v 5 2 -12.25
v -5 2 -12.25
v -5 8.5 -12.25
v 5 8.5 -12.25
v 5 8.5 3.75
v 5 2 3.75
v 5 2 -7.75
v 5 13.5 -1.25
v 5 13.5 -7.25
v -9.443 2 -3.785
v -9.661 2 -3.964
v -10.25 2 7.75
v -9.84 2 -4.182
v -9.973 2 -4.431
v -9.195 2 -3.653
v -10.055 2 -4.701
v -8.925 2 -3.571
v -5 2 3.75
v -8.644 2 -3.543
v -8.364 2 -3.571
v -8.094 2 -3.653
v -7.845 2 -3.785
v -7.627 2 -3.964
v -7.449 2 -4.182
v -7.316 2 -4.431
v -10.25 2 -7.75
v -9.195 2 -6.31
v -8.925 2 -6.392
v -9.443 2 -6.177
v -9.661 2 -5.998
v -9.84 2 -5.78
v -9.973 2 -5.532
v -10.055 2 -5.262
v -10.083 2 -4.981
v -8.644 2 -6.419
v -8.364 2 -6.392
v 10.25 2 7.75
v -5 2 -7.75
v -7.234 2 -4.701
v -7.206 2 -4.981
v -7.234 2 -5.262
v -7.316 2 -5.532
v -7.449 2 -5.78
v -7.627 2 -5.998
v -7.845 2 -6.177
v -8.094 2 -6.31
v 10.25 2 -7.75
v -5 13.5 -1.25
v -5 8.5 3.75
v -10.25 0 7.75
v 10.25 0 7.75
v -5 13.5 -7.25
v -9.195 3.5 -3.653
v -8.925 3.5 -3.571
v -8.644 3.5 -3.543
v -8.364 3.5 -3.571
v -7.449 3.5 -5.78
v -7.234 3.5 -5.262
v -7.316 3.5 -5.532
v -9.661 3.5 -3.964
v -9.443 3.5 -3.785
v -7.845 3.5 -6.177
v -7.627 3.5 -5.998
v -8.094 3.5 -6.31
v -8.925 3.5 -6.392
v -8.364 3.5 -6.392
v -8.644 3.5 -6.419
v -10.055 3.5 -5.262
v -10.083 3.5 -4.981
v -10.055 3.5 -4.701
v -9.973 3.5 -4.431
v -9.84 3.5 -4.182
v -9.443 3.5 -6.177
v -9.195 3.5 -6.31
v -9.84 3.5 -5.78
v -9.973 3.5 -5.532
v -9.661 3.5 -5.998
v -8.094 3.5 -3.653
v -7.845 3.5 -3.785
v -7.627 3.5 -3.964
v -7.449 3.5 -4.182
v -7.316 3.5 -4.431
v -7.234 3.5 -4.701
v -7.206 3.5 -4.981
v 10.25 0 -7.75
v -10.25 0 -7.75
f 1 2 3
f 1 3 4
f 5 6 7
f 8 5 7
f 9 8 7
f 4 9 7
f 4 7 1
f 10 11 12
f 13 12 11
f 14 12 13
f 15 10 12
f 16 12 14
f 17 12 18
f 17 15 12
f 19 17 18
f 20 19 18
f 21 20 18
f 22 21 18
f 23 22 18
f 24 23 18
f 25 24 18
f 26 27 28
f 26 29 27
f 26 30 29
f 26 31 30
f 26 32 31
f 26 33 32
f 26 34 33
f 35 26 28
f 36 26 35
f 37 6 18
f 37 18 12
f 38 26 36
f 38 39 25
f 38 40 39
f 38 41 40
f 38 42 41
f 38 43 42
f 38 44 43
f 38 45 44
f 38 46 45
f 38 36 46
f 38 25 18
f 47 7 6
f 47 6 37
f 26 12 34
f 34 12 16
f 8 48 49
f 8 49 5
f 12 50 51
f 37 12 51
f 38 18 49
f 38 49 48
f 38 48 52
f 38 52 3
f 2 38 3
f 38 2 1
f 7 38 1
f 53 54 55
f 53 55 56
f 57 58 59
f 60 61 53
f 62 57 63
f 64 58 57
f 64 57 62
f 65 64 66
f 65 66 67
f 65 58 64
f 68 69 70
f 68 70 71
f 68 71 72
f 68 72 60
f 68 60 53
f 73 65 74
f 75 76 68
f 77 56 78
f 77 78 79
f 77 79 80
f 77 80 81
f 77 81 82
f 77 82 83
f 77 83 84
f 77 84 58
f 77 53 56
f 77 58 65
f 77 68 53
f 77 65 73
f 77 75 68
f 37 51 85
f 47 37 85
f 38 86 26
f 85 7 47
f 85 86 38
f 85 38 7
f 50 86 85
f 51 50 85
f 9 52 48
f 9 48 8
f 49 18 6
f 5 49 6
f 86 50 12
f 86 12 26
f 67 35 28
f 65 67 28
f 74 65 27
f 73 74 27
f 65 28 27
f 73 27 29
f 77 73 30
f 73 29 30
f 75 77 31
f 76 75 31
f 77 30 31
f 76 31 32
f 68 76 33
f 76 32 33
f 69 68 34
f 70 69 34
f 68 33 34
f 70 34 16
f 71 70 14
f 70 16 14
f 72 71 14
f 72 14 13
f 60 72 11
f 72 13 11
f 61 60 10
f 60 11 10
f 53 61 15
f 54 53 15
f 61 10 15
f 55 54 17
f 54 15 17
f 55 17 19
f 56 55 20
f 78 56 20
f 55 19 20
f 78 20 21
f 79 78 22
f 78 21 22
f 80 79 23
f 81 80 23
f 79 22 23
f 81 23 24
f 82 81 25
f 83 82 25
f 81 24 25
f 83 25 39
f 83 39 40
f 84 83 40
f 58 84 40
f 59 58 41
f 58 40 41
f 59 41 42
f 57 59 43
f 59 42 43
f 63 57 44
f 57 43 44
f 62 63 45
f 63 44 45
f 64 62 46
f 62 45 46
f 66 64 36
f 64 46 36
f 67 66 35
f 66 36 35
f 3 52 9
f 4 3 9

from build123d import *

# Parameters (mm, degrees)
SKETCH1_W           = 20.5
SKETCH1_H           = 15.5
BOSS_EXTRUDE1_DEPTH = 2
SKETCH3_W           = 10
SKETCH3_H           = 16
BOSS_EXTRUDE3_DEPTH = 11.5
SKETCH4_R           = 1.43812907
BOSS_EXTRUDE5_DEPTH = 1.5
CHAMFER1_SIZE       = 5


with BuildPart() as part:
    # Sketch1 → Boss-Extrude1 (new body)
    with BuildSketch(Plane(origin=(0, 0, 0), x_dir=(1, 0, 0), z_dir=(0, 1, 0))):
        Rectangle(SKETCH1_W, SKETCH1_H)
    extrude(amount=BOSS_EXTRUDE1_DEPTH)

    # Sketch3 → Boss-Extrude3 (add)
    with BuildSketch(Plane(origin=(0, 2, 0), x_dir=(1, 0, 0), z_dir=(0, 1, 0))):
        with Locations((0, 4.25)):
            Rectangle(SKETCH3_W, SKETCH3_H)
    extrude(amount=BOSS_EXTRUDE3_DEPTH)

    # Sketch4 → Boss-Extrude5 (add)
    with BuildSketch(Plane(origin=(0, 2, 0), x_dir=(1, 0, 0), z_dir=(0, 1, 0))):
        with Locations(Location((-8.644410723, 4.981189745, 0), (0, 0, 90))):
            Circle(SKETCH4_R)
    extrude(amount=BOSS_EXTRUDE5_DEPTH)

    # Chamfer1
    chamfer1_edges = [part.edges().sort_by_distance(p)[0] for p in [
        (0, 13.5, 3.75),
        (0, 13.5, -12.25),
    ]]
    chamfer(chamfer1_edges, length=CHAMFER1_SIZE)


solid = part.part
